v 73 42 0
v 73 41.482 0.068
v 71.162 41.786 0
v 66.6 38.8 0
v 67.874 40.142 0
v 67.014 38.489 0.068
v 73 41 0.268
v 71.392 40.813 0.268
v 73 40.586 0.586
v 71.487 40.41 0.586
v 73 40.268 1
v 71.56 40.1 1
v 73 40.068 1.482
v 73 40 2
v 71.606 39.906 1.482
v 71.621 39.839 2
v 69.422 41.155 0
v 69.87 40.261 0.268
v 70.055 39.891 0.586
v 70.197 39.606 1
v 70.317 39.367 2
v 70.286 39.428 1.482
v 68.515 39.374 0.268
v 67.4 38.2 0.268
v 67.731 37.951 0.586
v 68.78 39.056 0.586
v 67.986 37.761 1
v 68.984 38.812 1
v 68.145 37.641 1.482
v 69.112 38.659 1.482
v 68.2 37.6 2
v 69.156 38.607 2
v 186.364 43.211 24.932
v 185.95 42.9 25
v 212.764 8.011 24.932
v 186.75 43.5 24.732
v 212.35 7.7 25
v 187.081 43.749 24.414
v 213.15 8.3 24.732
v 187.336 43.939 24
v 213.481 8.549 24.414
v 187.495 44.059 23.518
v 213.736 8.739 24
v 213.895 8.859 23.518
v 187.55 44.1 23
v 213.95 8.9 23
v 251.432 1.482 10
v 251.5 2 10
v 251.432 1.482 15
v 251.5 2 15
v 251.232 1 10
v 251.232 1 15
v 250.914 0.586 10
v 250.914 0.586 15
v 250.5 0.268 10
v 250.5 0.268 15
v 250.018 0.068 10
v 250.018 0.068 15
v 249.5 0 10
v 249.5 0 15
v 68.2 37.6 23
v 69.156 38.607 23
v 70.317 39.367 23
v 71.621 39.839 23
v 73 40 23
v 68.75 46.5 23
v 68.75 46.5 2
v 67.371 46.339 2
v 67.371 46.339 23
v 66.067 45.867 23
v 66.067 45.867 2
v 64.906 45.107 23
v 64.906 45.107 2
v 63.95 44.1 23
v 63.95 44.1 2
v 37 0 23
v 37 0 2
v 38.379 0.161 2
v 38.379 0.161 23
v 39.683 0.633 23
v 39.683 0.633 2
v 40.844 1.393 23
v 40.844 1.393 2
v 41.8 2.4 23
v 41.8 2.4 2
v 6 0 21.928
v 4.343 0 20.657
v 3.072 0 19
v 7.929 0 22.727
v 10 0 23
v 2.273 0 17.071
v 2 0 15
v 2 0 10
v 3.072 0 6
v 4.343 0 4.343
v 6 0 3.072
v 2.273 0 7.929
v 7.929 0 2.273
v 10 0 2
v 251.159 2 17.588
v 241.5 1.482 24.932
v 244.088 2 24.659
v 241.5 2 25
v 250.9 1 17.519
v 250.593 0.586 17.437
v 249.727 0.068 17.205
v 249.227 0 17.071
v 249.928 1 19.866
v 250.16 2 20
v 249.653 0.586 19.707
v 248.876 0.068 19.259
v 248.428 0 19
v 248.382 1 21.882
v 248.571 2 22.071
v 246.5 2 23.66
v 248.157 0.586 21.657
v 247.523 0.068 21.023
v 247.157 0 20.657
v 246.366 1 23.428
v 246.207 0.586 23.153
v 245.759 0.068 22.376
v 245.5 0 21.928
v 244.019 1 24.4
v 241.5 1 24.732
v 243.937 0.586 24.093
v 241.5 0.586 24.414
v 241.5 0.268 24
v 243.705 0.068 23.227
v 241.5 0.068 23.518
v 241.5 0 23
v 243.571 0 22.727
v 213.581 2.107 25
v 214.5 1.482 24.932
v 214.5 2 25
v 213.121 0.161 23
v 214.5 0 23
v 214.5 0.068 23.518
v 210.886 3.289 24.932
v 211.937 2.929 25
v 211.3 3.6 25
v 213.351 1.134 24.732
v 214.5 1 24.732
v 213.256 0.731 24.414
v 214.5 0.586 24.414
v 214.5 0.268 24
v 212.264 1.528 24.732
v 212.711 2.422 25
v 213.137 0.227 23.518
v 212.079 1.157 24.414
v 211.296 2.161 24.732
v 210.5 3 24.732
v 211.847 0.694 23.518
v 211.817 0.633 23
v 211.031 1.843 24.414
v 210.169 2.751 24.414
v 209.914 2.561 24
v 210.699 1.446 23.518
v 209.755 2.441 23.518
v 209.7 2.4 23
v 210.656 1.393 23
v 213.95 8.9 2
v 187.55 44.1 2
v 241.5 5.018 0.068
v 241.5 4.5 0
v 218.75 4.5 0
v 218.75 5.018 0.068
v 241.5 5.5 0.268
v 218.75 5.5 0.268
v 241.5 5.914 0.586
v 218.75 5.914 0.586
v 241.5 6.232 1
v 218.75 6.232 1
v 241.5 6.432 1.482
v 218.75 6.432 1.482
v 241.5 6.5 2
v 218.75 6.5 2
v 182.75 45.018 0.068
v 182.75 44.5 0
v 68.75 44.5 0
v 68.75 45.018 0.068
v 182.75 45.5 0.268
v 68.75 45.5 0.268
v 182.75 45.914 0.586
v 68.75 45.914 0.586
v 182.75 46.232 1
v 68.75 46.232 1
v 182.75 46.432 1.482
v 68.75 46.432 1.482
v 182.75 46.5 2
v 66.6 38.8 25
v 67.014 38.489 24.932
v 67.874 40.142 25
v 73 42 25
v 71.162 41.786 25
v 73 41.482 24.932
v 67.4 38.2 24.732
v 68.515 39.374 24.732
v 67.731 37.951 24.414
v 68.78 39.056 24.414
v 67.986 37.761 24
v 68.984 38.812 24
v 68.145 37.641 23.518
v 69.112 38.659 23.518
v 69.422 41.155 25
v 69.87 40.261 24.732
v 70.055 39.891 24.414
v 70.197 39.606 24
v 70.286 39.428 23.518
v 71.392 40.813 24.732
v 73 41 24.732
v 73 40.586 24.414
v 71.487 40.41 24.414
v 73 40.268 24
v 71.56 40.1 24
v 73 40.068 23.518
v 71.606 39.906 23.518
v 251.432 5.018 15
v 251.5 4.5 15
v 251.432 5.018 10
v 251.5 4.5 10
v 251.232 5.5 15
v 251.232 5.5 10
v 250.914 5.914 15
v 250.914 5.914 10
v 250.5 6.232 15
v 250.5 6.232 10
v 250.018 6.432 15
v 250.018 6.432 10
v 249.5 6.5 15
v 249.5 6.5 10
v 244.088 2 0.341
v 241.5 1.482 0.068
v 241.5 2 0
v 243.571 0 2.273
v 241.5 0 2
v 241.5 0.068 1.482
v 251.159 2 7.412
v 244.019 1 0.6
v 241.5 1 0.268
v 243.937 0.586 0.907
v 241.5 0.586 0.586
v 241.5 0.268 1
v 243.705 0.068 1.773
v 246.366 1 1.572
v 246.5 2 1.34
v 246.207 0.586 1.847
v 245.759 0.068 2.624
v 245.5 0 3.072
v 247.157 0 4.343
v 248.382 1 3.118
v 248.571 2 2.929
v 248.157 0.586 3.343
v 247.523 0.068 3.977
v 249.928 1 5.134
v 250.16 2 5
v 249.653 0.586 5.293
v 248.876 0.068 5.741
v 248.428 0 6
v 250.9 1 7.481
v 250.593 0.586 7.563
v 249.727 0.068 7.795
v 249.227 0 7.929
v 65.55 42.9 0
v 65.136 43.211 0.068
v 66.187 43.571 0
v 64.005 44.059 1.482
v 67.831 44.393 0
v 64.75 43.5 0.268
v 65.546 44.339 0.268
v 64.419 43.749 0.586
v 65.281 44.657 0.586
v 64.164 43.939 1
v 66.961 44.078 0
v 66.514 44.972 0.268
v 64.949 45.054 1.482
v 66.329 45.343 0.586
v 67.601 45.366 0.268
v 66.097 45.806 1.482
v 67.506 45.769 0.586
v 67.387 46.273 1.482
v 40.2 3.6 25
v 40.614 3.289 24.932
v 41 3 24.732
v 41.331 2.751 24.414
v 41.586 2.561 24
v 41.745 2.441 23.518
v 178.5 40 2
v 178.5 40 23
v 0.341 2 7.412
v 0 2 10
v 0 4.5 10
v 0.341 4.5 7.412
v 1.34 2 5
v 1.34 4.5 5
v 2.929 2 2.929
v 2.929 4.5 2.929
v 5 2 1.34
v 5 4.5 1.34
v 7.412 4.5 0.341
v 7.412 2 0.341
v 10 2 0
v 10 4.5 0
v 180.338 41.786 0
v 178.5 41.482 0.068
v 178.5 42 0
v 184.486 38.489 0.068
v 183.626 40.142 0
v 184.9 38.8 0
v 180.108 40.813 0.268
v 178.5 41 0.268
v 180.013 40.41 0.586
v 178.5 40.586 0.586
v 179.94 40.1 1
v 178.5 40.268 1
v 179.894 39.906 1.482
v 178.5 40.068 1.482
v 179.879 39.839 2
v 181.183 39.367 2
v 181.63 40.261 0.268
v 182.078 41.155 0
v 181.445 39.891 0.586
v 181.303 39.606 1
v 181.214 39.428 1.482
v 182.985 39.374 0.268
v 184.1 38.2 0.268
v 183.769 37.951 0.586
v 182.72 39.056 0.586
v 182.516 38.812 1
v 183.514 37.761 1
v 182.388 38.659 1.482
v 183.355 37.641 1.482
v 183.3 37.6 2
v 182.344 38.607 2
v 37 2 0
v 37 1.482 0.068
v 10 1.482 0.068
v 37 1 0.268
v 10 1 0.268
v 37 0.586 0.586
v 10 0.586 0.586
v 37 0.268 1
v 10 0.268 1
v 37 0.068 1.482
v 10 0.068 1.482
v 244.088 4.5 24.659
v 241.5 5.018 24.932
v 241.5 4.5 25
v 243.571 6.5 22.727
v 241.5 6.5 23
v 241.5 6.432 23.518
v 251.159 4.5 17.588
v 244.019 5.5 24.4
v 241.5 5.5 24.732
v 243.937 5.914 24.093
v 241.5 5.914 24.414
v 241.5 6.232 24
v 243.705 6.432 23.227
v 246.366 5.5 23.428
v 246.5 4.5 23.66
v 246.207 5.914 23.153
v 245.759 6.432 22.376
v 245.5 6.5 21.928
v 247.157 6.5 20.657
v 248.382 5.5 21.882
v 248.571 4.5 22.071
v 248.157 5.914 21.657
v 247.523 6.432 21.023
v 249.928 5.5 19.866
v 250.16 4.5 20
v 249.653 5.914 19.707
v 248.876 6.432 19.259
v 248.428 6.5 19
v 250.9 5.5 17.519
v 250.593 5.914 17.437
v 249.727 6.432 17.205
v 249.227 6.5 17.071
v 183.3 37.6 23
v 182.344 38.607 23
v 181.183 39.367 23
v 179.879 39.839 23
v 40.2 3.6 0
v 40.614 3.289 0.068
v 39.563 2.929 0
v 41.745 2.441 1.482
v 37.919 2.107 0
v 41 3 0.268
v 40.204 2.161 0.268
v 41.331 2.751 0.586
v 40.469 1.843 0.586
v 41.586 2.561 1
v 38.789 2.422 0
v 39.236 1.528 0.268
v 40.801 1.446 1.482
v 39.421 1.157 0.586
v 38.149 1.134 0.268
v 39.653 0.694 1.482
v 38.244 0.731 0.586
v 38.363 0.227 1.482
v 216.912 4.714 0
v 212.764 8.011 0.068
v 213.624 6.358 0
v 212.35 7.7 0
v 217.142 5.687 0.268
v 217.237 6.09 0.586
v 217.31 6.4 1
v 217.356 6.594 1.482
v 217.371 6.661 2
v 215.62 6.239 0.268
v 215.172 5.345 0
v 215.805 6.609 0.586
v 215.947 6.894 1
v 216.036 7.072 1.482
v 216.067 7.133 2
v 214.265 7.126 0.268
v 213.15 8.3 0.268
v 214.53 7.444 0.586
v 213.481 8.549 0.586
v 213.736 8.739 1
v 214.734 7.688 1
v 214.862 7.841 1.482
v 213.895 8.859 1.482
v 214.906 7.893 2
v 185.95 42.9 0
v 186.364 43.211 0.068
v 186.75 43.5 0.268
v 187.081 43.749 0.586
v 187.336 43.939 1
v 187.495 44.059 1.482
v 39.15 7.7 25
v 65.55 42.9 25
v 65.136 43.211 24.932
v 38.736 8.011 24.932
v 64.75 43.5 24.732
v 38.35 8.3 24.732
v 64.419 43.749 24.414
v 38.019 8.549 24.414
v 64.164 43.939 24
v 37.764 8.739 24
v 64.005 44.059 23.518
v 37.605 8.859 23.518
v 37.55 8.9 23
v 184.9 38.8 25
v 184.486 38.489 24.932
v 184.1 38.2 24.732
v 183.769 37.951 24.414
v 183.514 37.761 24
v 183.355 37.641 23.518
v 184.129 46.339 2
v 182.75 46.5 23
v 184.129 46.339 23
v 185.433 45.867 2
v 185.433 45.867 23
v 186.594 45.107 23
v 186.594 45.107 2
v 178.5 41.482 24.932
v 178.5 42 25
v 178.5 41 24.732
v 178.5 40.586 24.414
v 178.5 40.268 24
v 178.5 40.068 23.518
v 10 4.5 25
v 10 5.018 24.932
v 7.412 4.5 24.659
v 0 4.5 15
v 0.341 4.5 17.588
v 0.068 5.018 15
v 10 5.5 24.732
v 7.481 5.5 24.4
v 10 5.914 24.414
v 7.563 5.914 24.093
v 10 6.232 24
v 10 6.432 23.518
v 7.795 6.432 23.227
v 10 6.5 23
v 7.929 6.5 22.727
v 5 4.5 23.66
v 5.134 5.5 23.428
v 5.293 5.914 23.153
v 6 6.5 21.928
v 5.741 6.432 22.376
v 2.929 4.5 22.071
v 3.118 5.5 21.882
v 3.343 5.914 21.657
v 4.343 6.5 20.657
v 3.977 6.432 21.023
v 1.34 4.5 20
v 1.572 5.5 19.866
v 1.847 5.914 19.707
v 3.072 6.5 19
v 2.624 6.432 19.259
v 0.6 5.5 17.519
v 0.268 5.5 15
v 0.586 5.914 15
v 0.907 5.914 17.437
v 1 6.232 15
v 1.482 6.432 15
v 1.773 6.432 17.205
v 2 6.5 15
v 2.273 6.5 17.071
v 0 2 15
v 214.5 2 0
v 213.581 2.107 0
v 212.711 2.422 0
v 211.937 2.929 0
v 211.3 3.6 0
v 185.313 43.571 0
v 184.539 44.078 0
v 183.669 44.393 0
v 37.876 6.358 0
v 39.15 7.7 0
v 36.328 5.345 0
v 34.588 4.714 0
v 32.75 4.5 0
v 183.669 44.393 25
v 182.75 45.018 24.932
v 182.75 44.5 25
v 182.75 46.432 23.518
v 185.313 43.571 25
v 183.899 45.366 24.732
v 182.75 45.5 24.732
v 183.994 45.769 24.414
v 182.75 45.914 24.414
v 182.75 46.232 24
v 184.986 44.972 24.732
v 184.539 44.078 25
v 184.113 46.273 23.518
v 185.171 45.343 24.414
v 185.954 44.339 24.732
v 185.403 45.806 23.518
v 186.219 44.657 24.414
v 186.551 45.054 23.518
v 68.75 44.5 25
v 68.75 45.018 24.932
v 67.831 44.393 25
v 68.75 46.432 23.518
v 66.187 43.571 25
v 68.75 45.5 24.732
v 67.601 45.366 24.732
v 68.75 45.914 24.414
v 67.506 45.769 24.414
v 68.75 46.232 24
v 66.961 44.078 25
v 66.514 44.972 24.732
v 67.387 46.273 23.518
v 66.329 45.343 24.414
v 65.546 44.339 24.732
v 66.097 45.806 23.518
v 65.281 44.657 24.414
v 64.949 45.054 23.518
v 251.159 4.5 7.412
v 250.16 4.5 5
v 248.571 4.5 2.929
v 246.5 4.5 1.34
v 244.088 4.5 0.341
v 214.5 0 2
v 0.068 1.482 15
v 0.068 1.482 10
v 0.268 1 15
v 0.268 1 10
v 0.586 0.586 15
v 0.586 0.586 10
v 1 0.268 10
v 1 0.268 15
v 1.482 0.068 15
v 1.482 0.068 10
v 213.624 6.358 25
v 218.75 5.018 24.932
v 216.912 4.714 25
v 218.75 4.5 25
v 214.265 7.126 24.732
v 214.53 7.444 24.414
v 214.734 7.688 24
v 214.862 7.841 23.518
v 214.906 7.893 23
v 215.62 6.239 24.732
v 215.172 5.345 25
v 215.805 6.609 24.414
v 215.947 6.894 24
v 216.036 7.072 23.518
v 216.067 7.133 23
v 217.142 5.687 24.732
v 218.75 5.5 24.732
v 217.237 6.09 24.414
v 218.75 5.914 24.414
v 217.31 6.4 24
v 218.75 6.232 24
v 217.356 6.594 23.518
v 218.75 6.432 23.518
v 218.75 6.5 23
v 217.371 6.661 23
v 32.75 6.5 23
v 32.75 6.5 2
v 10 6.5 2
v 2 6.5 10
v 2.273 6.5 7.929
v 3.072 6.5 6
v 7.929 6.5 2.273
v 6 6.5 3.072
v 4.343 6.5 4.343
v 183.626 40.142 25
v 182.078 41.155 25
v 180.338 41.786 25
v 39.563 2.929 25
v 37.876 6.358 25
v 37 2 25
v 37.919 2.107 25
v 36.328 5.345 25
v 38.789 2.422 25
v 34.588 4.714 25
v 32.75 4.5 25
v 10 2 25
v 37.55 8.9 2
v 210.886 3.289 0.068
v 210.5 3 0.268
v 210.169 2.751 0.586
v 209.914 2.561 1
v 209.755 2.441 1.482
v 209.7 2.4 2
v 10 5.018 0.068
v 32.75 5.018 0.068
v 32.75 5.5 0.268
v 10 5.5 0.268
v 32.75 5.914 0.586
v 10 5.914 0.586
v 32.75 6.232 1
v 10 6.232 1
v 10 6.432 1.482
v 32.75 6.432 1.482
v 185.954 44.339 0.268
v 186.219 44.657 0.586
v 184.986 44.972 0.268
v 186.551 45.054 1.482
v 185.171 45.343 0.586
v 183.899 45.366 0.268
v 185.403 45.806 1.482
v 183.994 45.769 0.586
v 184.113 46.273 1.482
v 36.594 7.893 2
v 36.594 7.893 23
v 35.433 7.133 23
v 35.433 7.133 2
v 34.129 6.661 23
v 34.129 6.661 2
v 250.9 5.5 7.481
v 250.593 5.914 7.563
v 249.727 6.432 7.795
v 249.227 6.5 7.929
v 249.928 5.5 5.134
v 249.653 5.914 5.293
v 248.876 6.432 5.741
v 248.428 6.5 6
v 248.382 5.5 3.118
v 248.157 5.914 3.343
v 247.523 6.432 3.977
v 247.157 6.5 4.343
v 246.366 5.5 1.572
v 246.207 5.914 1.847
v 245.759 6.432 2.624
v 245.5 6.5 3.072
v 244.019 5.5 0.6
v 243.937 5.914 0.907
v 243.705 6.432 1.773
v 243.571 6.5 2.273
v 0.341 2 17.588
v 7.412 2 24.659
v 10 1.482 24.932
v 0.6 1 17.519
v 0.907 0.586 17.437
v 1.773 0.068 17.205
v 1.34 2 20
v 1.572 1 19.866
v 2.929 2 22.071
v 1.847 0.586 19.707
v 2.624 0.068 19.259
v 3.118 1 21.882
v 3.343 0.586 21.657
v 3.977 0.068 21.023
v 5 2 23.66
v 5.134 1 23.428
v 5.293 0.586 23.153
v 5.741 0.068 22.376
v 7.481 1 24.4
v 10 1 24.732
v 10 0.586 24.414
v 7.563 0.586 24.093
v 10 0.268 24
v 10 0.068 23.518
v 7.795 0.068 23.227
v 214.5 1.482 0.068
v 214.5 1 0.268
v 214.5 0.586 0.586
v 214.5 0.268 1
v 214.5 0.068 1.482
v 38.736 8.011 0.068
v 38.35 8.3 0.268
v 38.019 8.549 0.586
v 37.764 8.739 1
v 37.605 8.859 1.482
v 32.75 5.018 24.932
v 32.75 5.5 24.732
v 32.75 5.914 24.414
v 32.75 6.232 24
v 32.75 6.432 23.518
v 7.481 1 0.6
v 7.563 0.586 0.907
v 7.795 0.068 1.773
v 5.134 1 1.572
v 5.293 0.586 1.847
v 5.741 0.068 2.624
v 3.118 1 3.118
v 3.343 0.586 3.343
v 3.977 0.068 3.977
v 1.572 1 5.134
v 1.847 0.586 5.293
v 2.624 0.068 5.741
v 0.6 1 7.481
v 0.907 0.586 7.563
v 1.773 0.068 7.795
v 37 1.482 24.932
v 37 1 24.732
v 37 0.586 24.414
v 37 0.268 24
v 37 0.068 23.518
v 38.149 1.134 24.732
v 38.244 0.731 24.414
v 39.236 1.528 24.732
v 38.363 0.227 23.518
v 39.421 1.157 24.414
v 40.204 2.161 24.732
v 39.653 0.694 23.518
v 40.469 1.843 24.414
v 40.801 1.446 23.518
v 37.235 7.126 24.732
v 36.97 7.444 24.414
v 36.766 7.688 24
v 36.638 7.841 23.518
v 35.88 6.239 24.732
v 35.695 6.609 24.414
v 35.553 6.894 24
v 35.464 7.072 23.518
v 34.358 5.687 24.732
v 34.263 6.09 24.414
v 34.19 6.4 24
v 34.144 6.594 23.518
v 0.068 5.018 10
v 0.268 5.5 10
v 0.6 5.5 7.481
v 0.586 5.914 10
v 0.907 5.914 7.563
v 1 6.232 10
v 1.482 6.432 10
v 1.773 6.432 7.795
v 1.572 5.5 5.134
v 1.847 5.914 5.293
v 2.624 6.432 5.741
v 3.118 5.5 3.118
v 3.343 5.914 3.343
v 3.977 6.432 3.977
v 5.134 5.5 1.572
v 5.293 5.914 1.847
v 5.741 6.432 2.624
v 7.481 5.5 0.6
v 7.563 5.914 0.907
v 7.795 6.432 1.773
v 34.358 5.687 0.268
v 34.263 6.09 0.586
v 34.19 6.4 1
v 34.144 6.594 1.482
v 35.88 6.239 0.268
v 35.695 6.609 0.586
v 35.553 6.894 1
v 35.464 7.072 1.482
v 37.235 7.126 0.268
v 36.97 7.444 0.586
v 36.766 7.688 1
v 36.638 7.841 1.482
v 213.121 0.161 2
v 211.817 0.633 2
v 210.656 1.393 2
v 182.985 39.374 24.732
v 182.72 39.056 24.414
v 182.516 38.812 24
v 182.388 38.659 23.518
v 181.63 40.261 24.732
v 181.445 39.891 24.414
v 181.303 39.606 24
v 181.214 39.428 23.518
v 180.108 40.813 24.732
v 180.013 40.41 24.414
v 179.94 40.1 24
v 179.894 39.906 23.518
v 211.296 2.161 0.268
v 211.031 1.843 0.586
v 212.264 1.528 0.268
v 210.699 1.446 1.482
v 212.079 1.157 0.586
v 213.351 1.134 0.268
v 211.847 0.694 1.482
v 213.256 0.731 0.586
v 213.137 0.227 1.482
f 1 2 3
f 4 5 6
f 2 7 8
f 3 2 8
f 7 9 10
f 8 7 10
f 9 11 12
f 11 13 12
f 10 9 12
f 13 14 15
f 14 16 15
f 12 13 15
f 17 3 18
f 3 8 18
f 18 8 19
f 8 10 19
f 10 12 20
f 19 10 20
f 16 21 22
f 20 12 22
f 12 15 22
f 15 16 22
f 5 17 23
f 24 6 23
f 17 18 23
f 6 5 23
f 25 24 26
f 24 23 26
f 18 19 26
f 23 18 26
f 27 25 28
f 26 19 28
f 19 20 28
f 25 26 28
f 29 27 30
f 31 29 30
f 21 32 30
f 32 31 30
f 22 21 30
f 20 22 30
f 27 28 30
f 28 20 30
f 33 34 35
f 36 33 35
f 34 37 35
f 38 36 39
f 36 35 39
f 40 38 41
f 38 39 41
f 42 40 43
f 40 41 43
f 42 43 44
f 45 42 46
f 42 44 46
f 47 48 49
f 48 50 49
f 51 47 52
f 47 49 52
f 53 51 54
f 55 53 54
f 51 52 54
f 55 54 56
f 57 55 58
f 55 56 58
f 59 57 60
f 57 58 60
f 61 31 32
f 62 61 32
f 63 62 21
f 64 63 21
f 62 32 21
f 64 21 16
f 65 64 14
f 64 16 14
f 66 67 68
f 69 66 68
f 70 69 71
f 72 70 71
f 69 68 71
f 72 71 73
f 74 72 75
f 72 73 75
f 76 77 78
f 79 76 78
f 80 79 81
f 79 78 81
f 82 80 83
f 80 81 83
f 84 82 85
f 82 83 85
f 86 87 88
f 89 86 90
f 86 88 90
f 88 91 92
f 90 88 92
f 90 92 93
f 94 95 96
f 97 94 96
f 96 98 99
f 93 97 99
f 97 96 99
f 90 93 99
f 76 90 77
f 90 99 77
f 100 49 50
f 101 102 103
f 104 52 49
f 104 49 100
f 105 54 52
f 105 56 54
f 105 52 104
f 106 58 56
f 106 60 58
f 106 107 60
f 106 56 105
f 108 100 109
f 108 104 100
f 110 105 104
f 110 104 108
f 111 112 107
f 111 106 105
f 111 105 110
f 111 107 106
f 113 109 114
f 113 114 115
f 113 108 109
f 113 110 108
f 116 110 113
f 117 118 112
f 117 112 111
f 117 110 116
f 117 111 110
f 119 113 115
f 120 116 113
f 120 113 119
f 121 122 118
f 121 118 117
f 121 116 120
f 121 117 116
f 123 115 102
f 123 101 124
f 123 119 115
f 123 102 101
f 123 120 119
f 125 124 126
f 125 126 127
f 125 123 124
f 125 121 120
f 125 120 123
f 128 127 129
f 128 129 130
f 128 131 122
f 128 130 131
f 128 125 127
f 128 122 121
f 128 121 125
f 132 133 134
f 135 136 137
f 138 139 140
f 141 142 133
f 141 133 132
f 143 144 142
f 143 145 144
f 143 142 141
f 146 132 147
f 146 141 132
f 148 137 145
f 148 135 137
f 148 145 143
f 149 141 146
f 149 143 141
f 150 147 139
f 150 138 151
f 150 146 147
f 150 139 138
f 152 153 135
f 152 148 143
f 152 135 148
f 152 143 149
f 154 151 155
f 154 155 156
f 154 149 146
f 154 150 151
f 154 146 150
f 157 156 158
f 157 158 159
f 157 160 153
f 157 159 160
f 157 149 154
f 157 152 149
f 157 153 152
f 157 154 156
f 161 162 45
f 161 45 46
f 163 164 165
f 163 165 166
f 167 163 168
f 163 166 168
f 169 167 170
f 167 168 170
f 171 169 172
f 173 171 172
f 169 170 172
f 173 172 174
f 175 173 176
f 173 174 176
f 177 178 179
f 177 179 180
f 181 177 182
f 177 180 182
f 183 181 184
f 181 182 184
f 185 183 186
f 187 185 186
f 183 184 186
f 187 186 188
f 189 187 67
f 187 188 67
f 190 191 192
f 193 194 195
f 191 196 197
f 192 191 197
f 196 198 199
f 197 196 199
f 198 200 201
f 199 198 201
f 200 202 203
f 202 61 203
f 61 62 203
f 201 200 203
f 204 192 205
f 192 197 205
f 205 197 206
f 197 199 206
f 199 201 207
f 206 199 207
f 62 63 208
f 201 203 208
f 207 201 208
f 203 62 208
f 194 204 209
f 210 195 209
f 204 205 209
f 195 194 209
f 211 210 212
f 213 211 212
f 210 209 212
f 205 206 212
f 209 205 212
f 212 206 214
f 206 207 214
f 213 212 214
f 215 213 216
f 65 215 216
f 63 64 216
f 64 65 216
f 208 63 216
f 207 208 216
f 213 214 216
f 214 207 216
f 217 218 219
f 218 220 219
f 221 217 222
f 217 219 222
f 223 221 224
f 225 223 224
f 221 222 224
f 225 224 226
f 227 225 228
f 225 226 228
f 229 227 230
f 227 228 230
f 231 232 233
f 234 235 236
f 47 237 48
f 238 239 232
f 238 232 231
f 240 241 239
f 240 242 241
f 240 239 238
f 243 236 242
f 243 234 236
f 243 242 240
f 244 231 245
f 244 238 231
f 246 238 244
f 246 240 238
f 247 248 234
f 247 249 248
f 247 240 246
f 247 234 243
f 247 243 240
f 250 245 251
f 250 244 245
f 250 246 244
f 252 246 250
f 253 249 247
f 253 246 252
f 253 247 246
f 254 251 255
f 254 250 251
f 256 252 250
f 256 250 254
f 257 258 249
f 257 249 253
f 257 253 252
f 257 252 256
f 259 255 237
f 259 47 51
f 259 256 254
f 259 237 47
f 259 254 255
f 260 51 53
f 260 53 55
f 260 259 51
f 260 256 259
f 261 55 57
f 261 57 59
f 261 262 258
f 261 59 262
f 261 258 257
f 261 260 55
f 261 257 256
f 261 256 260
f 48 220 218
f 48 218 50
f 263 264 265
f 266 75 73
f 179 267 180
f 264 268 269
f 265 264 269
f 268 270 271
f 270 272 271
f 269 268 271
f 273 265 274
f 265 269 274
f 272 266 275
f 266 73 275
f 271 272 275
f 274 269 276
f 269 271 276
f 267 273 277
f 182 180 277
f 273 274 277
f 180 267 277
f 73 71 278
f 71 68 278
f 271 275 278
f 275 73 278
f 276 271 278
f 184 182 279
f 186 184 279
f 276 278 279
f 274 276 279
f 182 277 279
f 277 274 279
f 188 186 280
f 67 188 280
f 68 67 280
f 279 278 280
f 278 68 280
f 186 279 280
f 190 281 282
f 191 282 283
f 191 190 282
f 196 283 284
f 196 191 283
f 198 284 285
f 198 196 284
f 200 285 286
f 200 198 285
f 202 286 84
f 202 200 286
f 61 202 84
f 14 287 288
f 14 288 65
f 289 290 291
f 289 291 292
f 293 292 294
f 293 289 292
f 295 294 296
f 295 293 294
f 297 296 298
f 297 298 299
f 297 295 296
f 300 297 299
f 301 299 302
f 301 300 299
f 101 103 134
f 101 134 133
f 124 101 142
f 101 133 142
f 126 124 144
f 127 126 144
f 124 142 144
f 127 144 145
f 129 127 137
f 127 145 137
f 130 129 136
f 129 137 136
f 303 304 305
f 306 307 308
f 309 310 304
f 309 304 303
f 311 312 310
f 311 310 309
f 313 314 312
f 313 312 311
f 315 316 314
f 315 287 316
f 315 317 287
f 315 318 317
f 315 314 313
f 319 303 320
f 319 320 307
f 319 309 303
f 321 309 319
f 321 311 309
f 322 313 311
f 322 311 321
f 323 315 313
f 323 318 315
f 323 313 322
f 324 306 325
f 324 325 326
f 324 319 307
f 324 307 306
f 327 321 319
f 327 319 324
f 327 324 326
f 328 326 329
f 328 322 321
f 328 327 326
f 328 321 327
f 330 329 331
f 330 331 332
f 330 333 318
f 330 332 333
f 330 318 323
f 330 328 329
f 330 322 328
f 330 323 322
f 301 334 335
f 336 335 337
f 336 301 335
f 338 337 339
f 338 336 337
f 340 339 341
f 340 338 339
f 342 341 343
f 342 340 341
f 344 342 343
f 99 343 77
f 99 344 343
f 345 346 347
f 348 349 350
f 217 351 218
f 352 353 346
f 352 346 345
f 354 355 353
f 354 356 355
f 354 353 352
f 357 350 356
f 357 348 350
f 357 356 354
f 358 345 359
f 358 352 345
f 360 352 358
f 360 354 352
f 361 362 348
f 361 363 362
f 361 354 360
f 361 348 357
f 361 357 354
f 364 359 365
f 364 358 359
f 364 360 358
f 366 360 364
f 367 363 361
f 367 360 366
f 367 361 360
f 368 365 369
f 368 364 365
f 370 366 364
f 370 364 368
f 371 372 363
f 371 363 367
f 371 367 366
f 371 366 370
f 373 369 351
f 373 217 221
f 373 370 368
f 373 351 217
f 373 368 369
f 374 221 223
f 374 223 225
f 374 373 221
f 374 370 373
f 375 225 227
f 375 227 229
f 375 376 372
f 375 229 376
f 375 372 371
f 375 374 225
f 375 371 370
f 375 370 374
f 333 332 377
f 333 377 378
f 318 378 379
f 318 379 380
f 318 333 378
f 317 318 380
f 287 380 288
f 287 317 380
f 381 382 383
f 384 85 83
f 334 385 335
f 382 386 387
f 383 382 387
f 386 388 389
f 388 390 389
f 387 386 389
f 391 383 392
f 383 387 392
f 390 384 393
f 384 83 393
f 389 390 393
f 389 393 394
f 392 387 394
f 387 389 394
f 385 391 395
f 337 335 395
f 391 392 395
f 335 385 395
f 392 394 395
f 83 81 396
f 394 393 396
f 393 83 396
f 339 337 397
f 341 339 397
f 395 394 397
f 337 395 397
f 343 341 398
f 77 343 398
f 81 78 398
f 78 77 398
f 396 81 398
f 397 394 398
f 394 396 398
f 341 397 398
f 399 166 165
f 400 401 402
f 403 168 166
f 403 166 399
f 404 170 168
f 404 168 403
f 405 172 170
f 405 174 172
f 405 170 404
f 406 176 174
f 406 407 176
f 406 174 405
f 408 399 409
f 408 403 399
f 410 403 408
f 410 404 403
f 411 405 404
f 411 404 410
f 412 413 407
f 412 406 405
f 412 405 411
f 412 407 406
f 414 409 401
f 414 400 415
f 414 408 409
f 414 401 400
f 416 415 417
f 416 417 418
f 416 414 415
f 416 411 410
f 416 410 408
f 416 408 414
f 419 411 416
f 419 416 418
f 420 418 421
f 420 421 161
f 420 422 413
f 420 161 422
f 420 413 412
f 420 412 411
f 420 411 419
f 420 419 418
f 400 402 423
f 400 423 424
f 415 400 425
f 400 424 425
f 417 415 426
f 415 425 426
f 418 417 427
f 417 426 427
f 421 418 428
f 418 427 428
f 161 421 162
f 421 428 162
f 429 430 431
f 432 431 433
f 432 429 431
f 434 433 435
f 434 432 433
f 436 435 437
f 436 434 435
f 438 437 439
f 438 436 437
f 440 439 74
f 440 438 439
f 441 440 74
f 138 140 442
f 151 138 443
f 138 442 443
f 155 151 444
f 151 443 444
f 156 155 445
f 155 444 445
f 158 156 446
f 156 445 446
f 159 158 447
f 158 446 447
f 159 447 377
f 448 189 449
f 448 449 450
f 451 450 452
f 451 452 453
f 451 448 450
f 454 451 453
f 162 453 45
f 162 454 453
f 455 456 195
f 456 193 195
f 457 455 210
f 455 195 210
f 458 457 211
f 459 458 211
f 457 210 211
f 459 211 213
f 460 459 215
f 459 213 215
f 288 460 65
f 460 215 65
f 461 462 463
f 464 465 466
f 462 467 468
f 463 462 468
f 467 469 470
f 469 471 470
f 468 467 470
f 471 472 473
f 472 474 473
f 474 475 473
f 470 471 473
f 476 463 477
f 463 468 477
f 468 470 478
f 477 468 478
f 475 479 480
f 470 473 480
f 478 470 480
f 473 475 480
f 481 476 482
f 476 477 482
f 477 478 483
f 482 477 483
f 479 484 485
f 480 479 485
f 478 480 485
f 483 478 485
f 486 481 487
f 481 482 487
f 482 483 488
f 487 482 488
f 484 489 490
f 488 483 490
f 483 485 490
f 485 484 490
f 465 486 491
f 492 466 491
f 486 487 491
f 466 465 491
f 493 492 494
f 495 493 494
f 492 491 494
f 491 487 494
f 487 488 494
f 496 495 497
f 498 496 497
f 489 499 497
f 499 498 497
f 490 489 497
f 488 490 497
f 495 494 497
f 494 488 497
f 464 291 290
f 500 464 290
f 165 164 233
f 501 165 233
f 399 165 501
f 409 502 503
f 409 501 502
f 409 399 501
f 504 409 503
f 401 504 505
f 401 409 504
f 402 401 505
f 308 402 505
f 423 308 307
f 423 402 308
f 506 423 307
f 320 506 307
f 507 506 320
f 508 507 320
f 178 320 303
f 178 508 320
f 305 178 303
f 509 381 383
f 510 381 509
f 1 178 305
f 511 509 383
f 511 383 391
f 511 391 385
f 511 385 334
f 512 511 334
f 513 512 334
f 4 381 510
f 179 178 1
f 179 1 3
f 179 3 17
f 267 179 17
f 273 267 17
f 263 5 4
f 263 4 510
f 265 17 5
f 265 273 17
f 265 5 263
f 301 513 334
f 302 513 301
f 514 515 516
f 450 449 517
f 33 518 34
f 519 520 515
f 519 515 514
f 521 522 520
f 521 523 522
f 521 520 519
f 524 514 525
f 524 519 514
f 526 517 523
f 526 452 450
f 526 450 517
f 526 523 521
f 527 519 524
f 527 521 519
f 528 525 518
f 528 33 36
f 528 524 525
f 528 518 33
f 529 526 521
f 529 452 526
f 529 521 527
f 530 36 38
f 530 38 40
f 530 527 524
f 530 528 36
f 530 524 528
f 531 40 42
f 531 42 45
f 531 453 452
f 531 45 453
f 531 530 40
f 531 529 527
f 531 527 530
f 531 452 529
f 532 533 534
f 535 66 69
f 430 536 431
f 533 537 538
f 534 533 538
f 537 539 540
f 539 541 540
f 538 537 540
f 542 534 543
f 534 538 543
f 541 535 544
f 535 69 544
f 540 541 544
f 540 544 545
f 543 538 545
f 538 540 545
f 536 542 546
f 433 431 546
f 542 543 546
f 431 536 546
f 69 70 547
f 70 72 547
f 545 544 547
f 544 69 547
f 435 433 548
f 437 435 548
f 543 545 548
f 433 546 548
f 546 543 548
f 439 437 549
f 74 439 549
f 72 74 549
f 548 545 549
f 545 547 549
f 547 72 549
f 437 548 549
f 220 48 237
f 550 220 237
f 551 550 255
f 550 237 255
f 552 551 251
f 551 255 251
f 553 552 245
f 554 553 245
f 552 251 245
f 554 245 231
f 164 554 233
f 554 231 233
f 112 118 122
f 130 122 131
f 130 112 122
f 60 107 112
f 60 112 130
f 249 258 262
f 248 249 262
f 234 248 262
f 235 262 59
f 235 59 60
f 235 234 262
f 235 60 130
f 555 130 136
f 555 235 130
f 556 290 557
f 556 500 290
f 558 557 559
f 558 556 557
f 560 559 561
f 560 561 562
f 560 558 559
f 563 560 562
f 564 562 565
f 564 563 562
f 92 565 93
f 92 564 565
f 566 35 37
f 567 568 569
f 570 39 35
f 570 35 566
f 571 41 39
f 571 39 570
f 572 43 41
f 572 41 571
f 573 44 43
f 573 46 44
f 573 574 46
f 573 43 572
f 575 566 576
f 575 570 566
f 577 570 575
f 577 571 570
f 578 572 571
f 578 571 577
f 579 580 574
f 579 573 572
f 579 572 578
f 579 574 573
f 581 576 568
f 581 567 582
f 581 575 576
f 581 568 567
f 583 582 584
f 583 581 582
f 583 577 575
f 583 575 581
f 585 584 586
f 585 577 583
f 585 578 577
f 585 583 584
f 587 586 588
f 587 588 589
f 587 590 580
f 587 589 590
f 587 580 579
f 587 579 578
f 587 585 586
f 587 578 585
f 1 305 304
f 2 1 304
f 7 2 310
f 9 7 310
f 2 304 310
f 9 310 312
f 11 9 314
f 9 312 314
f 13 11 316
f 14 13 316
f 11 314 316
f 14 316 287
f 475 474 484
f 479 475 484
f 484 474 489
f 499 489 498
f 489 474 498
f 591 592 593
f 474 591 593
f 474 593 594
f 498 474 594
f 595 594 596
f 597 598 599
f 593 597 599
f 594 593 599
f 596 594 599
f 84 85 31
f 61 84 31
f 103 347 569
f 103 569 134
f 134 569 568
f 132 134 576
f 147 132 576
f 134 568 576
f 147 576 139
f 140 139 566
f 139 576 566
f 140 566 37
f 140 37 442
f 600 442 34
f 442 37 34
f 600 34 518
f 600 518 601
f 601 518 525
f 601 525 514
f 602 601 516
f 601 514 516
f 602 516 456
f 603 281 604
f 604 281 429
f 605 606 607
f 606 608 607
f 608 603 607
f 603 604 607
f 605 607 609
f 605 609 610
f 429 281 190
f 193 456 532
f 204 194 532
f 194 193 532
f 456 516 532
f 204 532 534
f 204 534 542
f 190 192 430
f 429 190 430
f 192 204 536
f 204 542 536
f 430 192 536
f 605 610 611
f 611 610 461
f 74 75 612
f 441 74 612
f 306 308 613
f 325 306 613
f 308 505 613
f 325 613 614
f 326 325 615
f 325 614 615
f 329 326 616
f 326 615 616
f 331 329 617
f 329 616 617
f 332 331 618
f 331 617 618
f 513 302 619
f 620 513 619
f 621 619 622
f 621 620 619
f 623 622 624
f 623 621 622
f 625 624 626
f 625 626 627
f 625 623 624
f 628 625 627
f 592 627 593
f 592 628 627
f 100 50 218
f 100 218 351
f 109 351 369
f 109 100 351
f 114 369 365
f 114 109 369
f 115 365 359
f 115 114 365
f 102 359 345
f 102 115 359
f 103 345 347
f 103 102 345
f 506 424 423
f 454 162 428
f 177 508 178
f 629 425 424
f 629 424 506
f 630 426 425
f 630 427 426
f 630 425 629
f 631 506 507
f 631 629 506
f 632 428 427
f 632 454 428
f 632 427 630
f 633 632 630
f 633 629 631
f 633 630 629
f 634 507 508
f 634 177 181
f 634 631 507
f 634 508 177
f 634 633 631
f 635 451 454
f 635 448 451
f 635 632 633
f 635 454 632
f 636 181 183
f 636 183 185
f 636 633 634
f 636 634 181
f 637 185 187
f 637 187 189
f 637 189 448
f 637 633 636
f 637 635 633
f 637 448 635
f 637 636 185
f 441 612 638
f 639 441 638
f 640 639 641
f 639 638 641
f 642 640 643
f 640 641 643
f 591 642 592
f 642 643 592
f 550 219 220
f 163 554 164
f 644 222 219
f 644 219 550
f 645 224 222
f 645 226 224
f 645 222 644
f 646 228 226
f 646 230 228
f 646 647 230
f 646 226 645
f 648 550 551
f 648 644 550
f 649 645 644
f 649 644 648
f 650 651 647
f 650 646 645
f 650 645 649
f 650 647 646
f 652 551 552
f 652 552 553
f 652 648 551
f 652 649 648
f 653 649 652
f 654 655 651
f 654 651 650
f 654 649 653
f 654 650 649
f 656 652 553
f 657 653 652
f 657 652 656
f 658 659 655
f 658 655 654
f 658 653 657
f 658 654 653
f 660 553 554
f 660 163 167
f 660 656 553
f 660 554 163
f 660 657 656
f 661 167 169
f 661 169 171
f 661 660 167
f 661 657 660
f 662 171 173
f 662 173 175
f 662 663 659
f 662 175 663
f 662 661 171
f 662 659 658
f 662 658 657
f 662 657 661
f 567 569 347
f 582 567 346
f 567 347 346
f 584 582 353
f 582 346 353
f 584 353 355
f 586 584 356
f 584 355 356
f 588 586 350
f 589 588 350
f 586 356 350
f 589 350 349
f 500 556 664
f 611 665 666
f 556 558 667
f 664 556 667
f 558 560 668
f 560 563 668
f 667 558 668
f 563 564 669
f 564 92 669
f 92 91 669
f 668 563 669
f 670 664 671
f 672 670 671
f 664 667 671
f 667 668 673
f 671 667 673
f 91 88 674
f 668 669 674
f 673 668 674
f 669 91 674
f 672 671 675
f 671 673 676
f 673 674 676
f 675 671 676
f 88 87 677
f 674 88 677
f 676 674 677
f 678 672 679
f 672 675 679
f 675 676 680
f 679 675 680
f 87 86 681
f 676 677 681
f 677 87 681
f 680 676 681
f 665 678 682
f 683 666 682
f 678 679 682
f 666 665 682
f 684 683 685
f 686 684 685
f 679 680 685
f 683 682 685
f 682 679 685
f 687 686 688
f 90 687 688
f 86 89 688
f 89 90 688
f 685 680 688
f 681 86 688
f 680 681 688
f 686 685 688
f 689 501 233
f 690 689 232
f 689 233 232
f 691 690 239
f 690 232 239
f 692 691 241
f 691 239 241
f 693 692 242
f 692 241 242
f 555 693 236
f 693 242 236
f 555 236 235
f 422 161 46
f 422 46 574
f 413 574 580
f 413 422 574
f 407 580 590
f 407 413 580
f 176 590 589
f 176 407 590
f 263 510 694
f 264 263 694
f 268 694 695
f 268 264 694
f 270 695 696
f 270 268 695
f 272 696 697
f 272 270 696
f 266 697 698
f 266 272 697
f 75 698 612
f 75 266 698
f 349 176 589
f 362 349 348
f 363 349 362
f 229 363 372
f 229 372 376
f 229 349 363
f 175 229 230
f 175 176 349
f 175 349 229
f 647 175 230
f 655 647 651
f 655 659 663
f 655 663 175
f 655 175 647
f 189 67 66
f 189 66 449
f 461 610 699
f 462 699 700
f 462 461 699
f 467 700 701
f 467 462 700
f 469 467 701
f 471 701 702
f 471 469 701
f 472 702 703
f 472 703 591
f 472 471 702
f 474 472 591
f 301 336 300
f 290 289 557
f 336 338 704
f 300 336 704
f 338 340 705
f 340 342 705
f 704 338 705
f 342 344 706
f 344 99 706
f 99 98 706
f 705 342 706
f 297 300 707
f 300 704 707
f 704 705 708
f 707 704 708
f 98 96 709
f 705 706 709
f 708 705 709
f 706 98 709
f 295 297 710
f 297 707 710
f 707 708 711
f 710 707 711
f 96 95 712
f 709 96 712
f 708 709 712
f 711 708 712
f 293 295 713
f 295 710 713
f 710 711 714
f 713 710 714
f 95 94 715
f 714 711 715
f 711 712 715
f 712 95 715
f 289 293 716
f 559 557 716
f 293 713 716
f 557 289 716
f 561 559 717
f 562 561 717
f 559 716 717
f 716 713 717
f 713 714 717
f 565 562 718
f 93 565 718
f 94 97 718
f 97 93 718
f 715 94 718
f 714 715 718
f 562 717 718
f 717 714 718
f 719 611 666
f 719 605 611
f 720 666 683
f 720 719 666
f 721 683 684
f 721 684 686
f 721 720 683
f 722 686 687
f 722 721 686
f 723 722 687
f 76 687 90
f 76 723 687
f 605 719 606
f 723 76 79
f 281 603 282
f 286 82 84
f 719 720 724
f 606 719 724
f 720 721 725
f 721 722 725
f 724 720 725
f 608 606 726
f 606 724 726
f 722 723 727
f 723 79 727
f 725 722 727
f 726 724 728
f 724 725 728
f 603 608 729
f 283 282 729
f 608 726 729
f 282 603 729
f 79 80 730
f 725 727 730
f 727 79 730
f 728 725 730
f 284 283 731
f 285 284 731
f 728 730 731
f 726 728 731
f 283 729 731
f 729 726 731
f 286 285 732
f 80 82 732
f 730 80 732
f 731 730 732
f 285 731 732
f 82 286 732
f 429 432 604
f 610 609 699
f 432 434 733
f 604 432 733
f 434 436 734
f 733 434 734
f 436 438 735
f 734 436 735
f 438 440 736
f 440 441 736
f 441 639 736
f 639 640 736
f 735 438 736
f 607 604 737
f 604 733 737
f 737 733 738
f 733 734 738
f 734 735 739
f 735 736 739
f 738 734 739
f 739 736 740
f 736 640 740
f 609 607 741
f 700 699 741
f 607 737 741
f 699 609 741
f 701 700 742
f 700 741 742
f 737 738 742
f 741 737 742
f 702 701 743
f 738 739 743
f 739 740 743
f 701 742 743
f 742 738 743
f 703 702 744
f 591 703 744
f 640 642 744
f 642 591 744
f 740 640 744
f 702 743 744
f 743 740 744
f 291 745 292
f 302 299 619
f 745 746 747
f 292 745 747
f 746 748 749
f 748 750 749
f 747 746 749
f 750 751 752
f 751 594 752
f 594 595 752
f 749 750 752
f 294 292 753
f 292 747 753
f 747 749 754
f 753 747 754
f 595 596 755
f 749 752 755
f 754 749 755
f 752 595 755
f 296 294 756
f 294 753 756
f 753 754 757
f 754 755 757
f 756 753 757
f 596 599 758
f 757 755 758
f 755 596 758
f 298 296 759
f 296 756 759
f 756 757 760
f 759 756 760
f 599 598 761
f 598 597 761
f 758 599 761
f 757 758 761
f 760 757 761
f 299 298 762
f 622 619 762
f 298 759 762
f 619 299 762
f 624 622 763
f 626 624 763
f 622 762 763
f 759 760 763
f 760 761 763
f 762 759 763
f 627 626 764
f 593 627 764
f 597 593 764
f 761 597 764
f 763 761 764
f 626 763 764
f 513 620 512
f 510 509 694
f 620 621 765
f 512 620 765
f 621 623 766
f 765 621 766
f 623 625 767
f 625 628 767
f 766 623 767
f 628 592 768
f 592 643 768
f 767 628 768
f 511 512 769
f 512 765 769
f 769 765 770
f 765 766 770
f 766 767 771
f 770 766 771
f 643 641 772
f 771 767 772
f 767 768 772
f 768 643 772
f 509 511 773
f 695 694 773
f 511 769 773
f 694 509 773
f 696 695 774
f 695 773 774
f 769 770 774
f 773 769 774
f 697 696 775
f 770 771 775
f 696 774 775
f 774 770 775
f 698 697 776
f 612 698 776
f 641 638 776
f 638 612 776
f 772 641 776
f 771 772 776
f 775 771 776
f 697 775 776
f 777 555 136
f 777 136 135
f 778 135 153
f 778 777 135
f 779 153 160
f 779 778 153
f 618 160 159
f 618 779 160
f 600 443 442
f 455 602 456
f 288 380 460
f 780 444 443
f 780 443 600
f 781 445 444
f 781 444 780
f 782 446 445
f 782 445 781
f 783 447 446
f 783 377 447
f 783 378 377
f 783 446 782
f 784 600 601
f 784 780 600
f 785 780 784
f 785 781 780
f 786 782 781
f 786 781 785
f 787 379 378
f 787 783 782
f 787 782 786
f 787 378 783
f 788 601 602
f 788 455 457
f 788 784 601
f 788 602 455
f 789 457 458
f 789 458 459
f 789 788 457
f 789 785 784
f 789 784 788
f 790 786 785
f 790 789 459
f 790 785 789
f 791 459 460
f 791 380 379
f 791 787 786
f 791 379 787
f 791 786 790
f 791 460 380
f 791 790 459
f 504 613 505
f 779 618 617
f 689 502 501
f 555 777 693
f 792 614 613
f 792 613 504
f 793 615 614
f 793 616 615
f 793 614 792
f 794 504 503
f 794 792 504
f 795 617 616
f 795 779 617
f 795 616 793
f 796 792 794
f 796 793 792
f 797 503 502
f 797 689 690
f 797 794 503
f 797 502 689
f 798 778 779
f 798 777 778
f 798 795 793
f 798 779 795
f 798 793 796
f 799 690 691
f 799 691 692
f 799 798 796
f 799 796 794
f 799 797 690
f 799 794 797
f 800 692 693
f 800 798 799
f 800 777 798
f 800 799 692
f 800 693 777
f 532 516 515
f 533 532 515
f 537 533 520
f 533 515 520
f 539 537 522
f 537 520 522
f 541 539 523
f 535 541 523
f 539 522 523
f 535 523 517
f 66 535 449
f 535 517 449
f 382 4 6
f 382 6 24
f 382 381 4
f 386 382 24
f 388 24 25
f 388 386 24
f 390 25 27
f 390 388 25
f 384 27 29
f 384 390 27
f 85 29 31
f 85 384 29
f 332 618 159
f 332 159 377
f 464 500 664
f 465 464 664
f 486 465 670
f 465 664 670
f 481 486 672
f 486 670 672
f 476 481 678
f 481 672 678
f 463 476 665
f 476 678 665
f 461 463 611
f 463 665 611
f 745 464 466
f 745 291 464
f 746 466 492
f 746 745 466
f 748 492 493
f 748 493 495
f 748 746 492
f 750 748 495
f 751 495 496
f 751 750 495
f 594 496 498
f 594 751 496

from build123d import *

# Parameters (mm, degrees)
F1_DEPTH = 25
F2_R     = 10
F3_R     = 2


with BuildPart() as f1:
    # F0 (on Top) → F1 (new body)
    with BuildSketch(Plane.XY):
        with BuildLine():
            Line((0, 6.5), (0, 0))
            Line((0, 0), (37, 0))
            ThreePointArc((37, 0), (39.683282, 0.633437), (41.8, 2.4))
            Line((41.8, 2.4), (68.2, 37.6))
            ThreePointArc((68.2, 37.6), (70.316718, 39.366563), (73, 40))
            Line((73, 40), (125.75, 40))
            Line((125.75, 40), (125.75, 46.5))
            Line((125.75, 46.5), (68.75, 46.5))
            ThreePointArc((68.75, 46.5), (66.066718, 45.866563), (63.95, 44.1))
            Line((63.95, 44.1), (37.55, 8.9))
            ThreePointArc((37.55, 8.9), (35.433282, 7.133437), (32.75, 6.5))
            Line((32.75, 6.5), (0, 6.5))
        make_face()
    extrude(amount=F1_DEPTH)

    # F2
    f2_edges = [f1.edges().sort_by_distance(p)[0] for p in [
        (0, 3.25, 25),
        (0, 3.25, 0),
    ]]
    fillet(f2_edges, radius=F2_R)

    # F3
    f3_edges = [f1.edges().sort_by_distance(p)[0] for p in [
        (99.375, 40, 25),
        (97.25, 46.5, 25),
    ]]
    fillet(f3_edges, radius=F3_R)

    # F4: F1 across face


with BuildPart() as f1_1:
    add(f1.part)
    add(f1.part.mirror(Plane(origin=(125.75, 43.25, 12.5), x_dir=(0, 1, 0), z_dir=(1, 0, 0))))


solid = f1_1.part
